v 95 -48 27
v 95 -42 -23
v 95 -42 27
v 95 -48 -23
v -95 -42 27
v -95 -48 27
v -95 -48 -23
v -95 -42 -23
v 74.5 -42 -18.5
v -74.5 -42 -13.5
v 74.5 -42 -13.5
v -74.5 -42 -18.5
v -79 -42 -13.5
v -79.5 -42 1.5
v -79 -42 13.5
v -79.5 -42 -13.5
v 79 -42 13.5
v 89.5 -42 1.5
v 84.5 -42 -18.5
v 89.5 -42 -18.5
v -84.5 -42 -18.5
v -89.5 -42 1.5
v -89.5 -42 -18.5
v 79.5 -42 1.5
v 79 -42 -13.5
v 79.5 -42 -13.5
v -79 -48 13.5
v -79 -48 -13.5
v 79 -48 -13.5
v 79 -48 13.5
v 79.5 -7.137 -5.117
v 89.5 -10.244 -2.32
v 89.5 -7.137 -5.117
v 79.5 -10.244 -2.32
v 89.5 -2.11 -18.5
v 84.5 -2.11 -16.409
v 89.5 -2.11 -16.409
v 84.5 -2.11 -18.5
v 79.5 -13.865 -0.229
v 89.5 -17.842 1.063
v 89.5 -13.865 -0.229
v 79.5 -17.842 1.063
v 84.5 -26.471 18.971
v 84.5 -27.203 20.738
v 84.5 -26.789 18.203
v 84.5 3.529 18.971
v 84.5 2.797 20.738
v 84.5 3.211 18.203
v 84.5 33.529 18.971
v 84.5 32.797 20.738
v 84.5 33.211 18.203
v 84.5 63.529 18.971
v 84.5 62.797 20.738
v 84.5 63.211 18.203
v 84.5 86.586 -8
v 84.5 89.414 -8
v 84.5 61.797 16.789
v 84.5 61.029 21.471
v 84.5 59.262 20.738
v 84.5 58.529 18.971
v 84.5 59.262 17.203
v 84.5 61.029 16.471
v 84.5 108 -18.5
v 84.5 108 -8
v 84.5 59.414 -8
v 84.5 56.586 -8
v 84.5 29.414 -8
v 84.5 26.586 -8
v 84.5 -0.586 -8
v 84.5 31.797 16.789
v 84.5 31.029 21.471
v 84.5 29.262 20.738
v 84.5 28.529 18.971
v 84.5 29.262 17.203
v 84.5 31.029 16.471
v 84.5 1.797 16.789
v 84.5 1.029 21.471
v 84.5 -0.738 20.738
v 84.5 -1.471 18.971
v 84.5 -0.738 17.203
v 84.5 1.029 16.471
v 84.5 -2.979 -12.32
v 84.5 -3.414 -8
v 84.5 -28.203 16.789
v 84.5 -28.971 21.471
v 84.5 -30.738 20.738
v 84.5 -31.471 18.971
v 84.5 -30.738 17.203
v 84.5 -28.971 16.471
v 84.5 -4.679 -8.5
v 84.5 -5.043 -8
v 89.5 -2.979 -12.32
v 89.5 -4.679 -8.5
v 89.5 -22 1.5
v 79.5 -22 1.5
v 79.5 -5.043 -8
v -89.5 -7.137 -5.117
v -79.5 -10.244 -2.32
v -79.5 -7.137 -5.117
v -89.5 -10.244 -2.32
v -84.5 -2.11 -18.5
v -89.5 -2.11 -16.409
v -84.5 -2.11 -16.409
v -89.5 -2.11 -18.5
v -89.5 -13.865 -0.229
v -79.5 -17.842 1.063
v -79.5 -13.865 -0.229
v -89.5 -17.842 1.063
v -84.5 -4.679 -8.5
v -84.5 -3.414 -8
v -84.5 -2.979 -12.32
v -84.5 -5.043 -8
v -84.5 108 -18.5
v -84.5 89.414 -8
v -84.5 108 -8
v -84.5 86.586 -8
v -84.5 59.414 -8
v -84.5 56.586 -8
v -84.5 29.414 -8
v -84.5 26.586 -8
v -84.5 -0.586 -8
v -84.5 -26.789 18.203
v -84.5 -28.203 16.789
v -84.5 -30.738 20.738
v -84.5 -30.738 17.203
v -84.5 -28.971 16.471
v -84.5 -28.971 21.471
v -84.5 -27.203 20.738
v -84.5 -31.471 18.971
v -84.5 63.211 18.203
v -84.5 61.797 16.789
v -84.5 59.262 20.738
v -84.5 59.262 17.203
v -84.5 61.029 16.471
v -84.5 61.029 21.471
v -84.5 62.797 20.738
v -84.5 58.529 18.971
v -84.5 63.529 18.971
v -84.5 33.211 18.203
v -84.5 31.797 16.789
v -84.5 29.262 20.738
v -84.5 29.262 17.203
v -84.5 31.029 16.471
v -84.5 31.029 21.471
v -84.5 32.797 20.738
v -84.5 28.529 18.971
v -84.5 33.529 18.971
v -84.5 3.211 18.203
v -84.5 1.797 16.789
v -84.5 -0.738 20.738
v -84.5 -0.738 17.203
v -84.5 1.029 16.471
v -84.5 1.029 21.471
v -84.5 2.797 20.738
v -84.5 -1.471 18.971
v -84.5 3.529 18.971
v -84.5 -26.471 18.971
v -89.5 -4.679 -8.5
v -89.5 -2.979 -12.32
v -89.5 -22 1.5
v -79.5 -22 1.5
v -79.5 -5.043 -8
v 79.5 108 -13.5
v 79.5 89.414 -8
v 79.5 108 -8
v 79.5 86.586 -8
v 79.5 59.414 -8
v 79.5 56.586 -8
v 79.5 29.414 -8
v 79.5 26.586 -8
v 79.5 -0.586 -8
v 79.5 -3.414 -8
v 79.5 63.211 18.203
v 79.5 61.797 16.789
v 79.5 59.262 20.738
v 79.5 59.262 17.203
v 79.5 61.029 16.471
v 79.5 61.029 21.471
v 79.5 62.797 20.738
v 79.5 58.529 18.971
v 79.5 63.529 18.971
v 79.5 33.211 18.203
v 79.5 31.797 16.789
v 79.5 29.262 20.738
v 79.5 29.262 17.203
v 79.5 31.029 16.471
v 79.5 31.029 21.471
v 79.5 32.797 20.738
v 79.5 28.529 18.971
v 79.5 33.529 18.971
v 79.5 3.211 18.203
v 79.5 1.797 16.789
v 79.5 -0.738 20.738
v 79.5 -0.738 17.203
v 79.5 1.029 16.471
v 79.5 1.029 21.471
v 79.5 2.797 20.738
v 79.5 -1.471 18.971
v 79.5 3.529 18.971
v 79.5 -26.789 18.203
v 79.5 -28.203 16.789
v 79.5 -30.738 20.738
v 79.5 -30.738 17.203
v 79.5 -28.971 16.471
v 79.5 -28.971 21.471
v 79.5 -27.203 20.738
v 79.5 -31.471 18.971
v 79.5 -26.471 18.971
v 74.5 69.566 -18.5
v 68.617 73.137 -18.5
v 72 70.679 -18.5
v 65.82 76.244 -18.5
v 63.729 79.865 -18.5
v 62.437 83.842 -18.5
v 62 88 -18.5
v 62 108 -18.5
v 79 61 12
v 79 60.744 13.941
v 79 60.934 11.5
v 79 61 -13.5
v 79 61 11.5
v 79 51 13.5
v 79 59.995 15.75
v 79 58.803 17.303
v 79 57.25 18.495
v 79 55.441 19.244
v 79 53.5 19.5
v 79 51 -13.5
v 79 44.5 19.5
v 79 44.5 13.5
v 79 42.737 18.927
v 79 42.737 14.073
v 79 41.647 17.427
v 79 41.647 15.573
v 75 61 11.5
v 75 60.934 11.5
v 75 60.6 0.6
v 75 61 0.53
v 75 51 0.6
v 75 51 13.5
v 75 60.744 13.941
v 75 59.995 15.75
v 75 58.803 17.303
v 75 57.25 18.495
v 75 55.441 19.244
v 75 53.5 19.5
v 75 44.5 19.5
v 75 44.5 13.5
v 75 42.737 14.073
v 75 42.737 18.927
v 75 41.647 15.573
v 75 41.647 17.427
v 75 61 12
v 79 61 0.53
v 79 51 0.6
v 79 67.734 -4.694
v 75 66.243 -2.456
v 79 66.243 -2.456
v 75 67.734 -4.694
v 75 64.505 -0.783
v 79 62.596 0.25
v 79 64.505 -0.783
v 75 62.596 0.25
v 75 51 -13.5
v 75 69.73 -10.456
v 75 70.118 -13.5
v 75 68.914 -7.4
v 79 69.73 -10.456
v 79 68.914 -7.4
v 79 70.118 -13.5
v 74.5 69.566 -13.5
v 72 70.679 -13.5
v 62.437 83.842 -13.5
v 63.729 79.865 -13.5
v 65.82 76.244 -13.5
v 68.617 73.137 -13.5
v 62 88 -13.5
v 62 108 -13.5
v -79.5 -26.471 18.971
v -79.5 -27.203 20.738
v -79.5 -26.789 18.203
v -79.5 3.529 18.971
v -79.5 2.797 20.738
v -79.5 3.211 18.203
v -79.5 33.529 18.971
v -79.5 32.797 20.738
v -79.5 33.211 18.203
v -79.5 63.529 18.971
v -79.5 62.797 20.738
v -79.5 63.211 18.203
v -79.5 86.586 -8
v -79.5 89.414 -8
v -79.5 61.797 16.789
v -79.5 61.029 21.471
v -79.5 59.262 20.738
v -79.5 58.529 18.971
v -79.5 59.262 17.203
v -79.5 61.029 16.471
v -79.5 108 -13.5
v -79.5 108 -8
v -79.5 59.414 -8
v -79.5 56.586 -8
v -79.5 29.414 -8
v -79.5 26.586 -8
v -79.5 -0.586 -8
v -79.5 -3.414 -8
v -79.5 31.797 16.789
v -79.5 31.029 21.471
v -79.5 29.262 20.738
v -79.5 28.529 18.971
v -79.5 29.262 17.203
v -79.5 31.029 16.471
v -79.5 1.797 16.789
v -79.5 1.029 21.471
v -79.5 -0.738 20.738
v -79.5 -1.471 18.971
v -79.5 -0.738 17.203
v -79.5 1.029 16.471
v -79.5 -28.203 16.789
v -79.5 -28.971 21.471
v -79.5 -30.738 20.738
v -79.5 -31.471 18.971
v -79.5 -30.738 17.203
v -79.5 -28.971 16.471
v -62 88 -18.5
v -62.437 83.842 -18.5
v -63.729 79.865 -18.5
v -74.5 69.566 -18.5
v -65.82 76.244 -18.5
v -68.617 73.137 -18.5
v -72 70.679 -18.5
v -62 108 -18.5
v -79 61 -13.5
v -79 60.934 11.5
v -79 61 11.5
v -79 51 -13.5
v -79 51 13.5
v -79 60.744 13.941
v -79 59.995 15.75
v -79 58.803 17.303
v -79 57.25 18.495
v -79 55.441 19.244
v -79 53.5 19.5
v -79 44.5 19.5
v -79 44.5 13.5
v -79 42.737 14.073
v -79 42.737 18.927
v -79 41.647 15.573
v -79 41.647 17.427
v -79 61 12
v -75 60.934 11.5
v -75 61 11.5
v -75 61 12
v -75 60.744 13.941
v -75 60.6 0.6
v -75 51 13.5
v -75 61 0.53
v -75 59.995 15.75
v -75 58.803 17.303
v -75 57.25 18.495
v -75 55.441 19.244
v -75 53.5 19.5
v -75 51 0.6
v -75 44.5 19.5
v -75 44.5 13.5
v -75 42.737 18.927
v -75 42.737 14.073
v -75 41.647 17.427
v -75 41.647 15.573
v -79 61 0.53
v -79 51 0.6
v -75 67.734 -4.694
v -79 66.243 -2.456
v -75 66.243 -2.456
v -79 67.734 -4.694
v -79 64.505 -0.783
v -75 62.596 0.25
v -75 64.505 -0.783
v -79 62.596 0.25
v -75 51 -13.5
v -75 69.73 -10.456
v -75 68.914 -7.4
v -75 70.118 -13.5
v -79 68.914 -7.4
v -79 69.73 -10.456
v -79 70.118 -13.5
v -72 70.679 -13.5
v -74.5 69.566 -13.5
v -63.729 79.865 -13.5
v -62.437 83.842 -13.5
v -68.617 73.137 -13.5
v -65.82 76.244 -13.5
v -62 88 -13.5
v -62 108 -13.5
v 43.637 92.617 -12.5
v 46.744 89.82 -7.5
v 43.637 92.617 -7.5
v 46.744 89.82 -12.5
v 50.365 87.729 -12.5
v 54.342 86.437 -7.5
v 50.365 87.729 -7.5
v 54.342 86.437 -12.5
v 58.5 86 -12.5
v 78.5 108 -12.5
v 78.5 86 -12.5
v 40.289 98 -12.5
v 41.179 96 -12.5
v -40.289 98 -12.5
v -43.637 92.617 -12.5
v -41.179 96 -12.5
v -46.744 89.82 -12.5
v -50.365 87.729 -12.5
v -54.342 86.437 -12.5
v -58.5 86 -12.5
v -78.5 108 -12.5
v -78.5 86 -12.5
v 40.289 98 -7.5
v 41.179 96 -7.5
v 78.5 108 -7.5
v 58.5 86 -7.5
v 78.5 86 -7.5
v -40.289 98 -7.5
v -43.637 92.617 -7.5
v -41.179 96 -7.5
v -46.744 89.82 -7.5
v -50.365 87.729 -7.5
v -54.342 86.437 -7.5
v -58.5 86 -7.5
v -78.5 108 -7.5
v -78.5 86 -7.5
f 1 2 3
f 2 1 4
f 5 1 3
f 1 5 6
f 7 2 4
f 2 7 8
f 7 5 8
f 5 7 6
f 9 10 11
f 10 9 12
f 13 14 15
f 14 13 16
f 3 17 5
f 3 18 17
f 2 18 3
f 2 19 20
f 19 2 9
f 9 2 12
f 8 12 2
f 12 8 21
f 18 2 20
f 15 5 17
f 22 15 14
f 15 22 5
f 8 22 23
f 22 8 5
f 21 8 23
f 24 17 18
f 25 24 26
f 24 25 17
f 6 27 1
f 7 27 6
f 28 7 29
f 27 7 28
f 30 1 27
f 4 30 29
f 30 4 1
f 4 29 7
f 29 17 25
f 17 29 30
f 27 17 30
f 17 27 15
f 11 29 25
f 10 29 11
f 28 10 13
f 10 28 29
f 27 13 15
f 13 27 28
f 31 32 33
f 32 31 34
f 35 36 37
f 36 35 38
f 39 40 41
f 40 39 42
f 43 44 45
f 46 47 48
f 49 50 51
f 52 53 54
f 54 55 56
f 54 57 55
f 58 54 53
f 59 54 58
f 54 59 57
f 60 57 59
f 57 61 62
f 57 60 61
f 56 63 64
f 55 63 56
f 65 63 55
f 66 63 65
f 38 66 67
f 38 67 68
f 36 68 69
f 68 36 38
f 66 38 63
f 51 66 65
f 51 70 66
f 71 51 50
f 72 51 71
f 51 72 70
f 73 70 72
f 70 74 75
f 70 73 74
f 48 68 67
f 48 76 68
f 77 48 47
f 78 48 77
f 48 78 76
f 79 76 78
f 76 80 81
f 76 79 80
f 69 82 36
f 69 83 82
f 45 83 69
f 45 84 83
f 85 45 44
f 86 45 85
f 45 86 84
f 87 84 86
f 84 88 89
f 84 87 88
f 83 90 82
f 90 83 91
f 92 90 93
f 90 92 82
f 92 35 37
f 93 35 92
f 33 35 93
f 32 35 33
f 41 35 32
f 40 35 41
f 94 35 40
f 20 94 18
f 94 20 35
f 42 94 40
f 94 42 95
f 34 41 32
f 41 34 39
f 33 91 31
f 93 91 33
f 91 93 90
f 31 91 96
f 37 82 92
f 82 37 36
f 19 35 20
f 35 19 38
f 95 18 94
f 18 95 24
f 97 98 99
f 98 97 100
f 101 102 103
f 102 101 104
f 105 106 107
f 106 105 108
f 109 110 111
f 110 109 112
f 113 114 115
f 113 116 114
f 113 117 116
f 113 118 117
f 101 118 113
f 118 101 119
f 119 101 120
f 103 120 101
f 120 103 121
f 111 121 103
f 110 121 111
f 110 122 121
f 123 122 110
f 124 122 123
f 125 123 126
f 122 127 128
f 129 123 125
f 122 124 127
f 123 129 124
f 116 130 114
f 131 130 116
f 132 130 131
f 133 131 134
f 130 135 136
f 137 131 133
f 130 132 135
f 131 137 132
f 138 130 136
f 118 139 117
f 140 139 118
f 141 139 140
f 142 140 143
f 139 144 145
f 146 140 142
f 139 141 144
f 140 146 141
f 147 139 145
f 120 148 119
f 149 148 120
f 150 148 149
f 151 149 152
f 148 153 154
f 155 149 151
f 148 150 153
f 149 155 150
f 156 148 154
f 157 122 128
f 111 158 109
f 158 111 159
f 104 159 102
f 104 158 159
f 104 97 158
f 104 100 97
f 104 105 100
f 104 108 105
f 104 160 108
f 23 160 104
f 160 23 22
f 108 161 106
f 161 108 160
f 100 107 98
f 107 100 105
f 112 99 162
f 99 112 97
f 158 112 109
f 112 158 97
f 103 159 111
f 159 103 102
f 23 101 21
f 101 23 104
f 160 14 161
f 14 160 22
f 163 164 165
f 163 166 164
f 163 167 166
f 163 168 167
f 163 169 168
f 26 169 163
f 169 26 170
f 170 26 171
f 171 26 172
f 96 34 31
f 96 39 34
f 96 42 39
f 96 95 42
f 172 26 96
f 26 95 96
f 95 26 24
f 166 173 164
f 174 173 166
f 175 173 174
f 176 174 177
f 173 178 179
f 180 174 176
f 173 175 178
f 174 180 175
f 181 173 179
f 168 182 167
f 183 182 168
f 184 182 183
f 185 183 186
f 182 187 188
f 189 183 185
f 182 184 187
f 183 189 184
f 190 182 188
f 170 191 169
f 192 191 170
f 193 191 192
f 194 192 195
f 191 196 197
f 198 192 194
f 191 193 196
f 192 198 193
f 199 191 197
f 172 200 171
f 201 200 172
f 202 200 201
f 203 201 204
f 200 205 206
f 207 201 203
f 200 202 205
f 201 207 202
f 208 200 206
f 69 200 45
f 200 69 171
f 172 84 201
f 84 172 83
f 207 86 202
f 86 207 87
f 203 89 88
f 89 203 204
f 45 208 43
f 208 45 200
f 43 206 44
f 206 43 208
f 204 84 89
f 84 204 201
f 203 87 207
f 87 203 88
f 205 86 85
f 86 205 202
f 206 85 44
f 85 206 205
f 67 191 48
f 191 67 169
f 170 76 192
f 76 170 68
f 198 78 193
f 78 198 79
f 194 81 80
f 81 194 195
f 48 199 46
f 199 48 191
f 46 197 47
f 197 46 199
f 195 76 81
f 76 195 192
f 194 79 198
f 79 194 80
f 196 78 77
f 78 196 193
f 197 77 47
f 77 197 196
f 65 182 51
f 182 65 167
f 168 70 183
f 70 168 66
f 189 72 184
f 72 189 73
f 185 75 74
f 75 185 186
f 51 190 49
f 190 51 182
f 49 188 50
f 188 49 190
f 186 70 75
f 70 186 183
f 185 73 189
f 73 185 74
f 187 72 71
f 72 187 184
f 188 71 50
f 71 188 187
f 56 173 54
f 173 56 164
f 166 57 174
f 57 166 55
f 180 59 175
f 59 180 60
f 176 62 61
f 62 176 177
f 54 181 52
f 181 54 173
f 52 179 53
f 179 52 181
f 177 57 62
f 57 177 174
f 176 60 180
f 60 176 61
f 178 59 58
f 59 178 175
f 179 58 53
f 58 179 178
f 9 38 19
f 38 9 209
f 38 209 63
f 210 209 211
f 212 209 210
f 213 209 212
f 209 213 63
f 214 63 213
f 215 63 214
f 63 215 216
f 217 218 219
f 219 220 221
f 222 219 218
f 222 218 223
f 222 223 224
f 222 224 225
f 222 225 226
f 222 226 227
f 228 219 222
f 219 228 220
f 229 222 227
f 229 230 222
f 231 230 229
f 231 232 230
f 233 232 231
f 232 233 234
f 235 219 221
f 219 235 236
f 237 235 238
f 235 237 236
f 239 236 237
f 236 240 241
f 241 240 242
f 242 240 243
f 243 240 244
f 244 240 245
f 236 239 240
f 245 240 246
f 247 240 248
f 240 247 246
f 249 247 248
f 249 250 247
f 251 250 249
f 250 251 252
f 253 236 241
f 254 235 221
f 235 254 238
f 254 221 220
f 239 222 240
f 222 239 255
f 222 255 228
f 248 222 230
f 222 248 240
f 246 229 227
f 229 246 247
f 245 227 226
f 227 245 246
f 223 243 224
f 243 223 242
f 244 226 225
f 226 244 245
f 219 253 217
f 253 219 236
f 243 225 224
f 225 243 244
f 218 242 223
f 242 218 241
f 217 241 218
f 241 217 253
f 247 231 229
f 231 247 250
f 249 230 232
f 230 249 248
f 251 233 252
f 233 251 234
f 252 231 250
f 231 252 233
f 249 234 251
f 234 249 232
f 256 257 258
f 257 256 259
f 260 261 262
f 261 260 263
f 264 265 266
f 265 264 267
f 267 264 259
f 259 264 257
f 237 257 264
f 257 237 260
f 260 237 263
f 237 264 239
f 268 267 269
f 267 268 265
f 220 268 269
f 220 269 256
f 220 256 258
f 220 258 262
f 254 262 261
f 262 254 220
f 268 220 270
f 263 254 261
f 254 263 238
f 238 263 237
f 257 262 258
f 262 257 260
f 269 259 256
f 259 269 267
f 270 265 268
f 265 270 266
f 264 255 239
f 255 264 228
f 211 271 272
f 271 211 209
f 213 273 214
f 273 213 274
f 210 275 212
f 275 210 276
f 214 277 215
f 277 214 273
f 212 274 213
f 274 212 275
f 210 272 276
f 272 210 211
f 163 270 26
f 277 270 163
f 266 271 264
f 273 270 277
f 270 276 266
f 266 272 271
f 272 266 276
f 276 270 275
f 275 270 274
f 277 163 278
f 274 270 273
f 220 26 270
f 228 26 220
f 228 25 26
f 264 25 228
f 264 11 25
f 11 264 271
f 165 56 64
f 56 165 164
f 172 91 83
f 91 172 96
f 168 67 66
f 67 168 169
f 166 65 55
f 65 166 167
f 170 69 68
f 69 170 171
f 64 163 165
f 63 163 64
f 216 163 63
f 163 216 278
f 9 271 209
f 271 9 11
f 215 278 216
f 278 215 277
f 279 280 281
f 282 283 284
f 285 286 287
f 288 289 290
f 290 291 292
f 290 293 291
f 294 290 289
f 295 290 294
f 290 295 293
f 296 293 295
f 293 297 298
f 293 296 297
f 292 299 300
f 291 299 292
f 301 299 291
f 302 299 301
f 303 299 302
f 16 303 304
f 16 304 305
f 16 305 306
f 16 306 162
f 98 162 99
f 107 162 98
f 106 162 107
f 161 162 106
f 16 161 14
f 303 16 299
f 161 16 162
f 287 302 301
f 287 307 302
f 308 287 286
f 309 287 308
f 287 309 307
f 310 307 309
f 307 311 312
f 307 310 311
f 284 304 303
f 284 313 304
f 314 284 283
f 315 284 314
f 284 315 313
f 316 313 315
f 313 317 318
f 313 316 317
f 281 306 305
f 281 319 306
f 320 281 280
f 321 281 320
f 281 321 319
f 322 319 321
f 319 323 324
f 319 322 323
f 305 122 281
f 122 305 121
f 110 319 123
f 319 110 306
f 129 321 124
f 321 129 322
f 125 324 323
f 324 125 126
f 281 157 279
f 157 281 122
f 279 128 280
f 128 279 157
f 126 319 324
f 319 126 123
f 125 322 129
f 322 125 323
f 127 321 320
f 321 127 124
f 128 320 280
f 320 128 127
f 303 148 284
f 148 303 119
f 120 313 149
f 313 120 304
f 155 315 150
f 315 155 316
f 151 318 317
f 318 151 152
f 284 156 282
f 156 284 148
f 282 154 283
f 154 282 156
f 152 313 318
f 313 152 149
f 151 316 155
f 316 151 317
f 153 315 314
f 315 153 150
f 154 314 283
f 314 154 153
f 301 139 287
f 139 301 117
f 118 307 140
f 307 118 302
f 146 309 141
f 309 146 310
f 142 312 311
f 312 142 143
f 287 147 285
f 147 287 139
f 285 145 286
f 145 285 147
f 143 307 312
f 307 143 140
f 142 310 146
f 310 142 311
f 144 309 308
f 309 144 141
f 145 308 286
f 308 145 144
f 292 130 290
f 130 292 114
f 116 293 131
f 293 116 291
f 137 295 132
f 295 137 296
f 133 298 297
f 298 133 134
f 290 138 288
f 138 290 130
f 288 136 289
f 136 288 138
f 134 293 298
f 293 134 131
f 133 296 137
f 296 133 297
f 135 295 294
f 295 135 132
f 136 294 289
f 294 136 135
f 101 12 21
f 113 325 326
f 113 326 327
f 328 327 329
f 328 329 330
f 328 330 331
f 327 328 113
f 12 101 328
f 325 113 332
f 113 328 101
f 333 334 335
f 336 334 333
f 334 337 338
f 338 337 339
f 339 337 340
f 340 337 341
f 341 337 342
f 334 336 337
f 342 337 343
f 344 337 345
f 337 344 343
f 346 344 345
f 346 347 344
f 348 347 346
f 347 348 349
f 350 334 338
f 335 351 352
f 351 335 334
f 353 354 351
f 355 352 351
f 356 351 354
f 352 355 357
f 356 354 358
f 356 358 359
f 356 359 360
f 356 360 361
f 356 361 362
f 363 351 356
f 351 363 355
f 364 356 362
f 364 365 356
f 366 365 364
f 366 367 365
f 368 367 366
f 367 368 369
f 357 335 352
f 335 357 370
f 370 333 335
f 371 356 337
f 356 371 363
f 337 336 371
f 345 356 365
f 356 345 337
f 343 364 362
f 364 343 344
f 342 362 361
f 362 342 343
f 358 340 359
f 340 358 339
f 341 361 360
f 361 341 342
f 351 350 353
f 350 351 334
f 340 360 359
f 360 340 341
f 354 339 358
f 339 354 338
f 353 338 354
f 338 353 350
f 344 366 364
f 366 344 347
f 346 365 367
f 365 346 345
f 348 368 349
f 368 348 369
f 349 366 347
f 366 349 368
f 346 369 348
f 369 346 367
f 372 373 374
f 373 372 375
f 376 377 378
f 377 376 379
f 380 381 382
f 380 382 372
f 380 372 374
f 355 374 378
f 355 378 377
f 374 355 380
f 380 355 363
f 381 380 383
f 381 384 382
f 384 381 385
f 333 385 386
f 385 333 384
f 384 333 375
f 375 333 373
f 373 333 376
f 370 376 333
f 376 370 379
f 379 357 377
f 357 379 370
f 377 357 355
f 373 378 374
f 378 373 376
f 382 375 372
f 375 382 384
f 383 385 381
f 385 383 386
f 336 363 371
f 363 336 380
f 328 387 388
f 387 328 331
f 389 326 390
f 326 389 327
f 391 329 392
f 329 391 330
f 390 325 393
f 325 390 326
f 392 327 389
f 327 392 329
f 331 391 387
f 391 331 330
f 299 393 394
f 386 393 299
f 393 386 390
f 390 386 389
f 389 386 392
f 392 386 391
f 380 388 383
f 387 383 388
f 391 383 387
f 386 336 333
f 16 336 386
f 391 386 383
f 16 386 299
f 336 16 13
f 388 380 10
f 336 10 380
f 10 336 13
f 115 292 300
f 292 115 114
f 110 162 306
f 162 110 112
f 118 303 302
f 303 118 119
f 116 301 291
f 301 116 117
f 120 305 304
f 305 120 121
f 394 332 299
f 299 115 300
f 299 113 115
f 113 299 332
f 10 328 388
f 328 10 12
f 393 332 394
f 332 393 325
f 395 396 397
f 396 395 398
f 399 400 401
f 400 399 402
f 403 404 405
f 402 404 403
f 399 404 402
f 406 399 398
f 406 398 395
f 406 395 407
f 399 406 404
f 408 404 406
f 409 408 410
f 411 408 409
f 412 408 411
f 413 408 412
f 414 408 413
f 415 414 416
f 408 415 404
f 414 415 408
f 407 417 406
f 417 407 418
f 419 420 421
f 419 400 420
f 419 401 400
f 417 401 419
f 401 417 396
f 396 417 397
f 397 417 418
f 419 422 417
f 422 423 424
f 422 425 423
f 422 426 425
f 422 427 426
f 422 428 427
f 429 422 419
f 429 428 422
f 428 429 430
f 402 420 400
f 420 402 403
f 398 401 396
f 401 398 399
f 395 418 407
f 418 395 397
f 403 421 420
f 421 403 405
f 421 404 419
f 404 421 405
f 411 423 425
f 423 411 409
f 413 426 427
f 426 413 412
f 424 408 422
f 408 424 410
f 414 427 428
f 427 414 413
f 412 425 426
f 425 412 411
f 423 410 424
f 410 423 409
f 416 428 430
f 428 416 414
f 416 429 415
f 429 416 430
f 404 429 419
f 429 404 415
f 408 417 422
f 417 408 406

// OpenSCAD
//ForPrint();
ForDisplay();

module ForDisplay(){
	rotate([0,0,0]) FrontPlate();
	translate([82,33,-13]) Rail();
	mirror([180,0,0]) translate([82,33,-13]) Rail();
	translate([0,103,-10])  BackRail();
}

module ForPrint(){
	translate([0,-70,0]) FrontPlate();
	translate([82,33,-13]) Rail();
	mirror([180,0,0]) translate([82,33,-13]) Rail();
	translate([0,40,0]) translate([0,103,-10])  BackRail();	
}

module FrontPlate(){
difference(){
	translate([0,-45,2]) cube([190,6,50],center=true); //Front plate
	cube([158,101,27],center=true); // switch size
}

translate([90,-22,-15.5]) GlueSpot();
mirror([180,0,0]) translate([90,-22,-15.5]) GlueSpot();
	
}

module BackRail(){

	cube([157,10,5], center=true);
	rotate([0,-90,90]) translate([3,-58.5,0]) GlueSpot();
	mirror([180,0,0]) rotate([0,-90,90]) translate([3,-58.5,0]) GlueSpot();

}

module Rail(){
	
	cube([5,150,10],center=true); //Virtical
	translate([-2.5,0,-3]) cube([10,150,5],center=true); //Horizontal
	
	translate([0,-45,15]) rotate([45,0,0]) CompressFit();
	translate([0,-15,15]) rotate([45,0,0]) CompressFit();
	translate([0,15,15]) rotate([45,0,0]) CompressFit();
	translate([0,45,15]) rotate([45,0,0]) CompressFit();
	
	translate([3,-55,-2.5]) GlueSpot();
	
//Stop Block
	difference(){
		union(){
			translate([-5,23,10]) cube([4,10,29],center=true); //Virtical
			rotate([90,0,0]) translate([-5,29.5,-16]) cube([4,6,9],center=true);  // Horizontal 
			translate([-5,20.5,25]) rotate([0,90,0]) cylinder(h=4,d=15,center=true); //Outside
			translate([-5,11.5,29.5]) rotate([0,90,0]) cylinder(h=4,d=6,center=true); //End
		}
	translate([-5,8,12]) cube([6,20,29],center=true); // Cut Out
	}
	scale([.8,.48,.80]) translate([-3.25,57.5,0])  GlueSpot();
//
	
	translate([-10,65,-3]) cube([20,20,5],center=true); //Back Block
	
	difference(){
		translate([0,55,-3]) cylinder(h=5,r=20,center=true);
		translate([10,55,-3]) cube([20,40,7],center=true);
	}
}

module  CompressFit(){
	cube([5,2,50],center=true);
	translate([0,0,24]) rotate([0,90,0]) cylinder(h=5,d=5,center=true);
}

module GlueSpot(){
rotate([0,90,0])	
	translate([3,0,0])
		 difference(){
			union(){
				translate([0,0,-3]) cylinder(h=5,r=20,center=true);
				translate([-10,-10,-3]) cube([20,20,5],center=true);
			}
			translate([10,0,-3]) cube([20,40,7],center=true);
		}
}
